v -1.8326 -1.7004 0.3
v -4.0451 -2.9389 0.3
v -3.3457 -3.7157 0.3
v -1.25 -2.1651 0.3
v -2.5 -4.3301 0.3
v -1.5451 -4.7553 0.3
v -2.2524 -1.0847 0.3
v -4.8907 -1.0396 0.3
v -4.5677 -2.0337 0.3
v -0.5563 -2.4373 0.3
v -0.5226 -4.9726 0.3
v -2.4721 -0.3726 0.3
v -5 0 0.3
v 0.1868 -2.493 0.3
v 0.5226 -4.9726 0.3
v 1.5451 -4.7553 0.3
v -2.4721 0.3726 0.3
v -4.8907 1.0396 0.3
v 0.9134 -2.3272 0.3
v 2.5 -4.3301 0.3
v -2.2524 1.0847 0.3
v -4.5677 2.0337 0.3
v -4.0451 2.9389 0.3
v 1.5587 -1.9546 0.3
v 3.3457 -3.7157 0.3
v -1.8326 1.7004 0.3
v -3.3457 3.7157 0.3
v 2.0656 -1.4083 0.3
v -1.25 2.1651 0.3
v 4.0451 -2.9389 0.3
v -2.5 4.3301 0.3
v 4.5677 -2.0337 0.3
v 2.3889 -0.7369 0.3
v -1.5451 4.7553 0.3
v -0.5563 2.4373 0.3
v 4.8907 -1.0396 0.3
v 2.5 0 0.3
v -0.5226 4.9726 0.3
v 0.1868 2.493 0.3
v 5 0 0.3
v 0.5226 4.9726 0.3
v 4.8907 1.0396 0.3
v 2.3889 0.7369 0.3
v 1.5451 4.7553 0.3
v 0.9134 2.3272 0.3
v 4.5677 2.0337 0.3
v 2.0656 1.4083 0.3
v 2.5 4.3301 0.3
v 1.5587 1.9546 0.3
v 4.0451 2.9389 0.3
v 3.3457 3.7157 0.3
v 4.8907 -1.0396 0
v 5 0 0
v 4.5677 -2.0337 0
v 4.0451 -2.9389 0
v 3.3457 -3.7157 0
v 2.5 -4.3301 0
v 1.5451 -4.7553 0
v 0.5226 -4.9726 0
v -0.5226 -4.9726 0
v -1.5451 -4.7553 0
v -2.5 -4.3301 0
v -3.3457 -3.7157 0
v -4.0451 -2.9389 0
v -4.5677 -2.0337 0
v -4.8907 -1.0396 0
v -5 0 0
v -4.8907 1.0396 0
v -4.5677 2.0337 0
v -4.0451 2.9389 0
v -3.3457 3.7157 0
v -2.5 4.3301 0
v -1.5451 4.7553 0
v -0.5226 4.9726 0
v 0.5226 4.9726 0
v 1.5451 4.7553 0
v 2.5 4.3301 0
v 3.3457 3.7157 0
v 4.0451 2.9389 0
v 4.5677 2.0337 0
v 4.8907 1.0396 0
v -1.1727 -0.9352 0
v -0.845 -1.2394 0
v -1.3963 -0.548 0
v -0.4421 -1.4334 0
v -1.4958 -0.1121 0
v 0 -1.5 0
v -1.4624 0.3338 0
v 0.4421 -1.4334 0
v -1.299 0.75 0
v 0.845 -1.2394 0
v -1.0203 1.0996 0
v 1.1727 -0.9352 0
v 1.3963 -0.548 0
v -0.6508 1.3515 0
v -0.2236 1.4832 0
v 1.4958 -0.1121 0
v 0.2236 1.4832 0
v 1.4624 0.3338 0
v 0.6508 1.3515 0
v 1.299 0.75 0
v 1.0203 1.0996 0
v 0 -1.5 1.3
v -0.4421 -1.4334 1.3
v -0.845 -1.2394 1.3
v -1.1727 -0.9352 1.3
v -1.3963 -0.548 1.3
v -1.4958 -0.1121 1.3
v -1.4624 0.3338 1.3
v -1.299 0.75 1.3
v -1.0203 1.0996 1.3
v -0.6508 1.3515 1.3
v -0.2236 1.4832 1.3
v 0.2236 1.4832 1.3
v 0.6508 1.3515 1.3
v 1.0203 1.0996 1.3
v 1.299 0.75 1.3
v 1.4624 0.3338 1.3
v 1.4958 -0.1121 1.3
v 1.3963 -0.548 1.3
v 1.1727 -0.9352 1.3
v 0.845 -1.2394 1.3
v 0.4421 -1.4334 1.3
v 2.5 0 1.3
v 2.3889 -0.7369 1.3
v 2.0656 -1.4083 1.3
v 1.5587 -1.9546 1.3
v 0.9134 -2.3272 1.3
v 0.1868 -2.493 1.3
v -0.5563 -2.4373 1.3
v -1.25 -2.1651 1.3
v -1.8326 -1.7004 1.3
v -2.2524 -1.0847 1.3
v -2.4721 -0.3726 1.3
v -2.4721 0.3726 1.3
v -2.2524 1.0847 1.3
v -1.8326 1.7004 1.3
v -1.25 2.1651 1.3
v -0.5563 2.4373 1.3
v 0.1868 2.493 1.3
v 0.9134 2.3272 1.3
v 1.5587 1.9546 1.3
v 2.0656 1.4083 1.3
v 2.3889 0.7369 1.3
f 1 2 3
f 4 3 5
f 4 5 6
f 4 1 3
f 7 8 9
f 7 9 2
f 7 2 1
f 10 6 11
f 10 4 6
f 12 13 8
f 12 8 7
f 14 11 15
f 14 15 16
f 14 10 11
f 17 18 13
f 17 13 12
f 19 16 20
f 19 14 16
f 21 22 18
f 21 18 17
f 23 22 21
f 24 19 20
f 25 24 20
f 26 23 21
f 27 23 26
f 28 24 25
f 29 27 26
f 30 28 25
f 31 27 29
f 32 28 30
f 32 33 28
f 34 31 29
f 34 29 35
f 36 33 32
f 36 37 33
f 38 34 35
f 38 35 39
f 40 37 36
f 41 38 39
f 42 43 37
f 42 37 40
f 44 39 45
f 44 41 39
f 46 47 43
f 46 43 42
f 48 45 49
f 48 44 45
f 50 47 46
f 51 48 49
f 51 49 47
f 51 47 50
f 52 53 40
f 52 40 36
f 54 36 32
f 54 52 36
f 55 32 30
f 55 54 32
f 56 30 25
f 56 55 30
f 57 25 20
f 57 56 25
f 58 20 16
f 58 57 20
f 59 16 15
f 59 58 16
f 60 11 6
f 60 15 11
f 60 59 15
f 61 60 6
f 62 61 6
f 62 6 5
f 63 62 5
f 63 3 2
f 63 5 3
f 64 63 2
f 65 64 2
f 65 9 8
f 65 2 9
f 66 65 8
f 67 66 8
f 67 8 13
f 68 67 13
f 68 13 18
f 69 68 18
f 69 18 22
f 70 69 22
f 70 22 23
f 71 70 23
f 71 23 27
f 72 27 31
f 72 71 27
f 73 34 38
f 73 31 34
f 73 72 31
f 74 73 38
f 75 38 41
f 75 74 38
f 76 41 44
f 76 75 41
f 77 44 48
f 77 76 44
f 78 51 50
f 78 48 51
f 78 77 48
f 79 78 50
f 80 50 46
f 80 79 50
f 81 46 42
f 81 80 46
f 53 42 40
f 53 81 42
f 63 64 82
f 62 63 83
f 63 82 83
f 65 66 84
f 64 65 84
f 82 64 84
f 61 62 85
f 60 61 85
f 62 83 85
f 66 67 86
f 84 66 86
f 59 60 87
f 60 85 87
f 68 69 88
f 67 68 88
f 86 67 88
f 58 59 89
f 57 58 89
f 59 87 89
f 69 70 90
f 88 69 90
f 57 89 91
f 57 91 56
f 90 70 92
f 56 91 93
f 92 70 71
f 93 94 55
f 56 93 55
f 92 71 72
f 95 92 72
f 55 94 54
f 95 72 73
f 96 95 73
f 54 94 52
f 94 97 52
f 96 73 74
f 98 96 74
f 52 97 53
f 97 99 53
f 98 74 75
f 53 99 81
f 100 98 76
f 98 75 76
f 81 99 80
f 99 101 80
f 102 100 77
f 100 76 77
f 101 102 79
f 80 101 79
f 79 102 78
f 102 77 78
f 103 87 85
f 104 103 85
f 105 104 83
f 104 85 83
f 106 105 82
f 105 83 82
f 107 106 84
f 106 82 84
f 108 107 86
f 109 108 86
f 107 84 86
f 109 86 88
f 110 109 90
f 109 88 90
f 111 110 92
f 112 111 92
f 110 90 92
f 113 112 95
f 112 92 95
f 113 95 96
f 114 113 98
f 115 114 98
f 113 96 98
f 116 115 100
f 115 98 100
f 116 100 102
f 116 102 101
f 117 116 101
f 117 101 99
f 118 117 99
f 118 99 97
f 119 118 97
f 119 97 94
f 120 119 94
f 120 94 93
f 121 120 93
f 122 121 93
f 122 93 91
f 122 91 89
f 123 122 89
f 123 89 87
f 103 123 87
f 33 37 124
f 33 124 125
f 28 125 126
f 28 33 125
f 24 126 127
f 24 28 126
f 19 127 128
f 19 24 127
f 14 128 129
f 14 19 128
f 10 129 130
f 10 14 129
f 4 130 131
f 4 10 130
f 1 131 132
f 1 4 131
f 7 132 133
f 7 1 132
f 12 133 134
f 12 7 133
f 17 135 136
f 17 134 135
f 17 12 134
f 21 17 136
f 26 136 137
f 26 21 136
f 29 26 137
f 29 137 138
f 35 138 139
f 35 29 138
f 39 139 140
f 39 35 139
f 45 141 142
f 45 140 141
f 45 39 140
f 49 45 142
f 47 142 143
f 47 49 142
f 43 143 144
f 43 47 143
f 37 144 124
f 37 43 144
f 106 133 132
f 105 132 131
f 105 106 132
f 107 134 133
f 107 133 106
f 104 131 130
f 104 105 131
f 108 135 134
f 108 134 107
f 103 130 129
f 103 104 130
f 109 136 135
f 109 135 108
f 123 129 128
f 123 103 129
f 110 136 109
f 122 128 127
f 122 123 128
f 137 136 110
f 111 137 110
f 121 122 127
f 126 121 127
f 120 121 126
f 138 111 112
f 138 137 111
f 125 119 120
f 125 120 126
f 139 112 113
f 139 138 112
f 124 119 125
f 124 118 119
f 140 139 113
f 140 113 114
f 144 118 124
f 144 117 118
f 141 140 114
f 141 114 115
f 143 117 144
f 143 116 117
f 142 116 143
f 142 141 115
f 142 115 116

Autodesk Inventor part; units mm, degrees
ref_plane "YZ Plane" through (0, 0, 0) normal (1, 0, 0) x (0, 1, 0)
ref_plane "XZ Plane" through (0, 0, 0) normal (0, 1, 0) x (-1, 0, 0)
ref_plane "XY Plane" through (0, 0, 0) normal (0, 0, 1) x (1, 0, 0)
sketch "スケッチ1" plane through (0, 0, 0) normal (0, 0, 1) x (1, 0, 0)
  circle A0 centre (0, 0) radius 5
  dimension "d0" = 10
extrude "押し出し1" add sketch "スケッチ1" along normal blind 0.3
sketch "スケッチ2" plane through (0, 0, 0.3) normal (0, 0, 1) x (1, 0, 0)
  circle A0 centre (0, 0) radius 2.5
  dimension "d3" = 5
extrude "押し出し2" add sketch "スケッチ2" along normal blind 1
sketch "スケッチ3" plane through (0, 0, 1.3) normal (0, 0, 1) x (1, 0, 0)
  point P0 (0, 0)
  point P1 (0, 0)
hole "穴1" at (0, 0, 1.3) direction (0, 0, -1) diameter 3 end through all
properties part number "Φ3軸用プッシュナット"
